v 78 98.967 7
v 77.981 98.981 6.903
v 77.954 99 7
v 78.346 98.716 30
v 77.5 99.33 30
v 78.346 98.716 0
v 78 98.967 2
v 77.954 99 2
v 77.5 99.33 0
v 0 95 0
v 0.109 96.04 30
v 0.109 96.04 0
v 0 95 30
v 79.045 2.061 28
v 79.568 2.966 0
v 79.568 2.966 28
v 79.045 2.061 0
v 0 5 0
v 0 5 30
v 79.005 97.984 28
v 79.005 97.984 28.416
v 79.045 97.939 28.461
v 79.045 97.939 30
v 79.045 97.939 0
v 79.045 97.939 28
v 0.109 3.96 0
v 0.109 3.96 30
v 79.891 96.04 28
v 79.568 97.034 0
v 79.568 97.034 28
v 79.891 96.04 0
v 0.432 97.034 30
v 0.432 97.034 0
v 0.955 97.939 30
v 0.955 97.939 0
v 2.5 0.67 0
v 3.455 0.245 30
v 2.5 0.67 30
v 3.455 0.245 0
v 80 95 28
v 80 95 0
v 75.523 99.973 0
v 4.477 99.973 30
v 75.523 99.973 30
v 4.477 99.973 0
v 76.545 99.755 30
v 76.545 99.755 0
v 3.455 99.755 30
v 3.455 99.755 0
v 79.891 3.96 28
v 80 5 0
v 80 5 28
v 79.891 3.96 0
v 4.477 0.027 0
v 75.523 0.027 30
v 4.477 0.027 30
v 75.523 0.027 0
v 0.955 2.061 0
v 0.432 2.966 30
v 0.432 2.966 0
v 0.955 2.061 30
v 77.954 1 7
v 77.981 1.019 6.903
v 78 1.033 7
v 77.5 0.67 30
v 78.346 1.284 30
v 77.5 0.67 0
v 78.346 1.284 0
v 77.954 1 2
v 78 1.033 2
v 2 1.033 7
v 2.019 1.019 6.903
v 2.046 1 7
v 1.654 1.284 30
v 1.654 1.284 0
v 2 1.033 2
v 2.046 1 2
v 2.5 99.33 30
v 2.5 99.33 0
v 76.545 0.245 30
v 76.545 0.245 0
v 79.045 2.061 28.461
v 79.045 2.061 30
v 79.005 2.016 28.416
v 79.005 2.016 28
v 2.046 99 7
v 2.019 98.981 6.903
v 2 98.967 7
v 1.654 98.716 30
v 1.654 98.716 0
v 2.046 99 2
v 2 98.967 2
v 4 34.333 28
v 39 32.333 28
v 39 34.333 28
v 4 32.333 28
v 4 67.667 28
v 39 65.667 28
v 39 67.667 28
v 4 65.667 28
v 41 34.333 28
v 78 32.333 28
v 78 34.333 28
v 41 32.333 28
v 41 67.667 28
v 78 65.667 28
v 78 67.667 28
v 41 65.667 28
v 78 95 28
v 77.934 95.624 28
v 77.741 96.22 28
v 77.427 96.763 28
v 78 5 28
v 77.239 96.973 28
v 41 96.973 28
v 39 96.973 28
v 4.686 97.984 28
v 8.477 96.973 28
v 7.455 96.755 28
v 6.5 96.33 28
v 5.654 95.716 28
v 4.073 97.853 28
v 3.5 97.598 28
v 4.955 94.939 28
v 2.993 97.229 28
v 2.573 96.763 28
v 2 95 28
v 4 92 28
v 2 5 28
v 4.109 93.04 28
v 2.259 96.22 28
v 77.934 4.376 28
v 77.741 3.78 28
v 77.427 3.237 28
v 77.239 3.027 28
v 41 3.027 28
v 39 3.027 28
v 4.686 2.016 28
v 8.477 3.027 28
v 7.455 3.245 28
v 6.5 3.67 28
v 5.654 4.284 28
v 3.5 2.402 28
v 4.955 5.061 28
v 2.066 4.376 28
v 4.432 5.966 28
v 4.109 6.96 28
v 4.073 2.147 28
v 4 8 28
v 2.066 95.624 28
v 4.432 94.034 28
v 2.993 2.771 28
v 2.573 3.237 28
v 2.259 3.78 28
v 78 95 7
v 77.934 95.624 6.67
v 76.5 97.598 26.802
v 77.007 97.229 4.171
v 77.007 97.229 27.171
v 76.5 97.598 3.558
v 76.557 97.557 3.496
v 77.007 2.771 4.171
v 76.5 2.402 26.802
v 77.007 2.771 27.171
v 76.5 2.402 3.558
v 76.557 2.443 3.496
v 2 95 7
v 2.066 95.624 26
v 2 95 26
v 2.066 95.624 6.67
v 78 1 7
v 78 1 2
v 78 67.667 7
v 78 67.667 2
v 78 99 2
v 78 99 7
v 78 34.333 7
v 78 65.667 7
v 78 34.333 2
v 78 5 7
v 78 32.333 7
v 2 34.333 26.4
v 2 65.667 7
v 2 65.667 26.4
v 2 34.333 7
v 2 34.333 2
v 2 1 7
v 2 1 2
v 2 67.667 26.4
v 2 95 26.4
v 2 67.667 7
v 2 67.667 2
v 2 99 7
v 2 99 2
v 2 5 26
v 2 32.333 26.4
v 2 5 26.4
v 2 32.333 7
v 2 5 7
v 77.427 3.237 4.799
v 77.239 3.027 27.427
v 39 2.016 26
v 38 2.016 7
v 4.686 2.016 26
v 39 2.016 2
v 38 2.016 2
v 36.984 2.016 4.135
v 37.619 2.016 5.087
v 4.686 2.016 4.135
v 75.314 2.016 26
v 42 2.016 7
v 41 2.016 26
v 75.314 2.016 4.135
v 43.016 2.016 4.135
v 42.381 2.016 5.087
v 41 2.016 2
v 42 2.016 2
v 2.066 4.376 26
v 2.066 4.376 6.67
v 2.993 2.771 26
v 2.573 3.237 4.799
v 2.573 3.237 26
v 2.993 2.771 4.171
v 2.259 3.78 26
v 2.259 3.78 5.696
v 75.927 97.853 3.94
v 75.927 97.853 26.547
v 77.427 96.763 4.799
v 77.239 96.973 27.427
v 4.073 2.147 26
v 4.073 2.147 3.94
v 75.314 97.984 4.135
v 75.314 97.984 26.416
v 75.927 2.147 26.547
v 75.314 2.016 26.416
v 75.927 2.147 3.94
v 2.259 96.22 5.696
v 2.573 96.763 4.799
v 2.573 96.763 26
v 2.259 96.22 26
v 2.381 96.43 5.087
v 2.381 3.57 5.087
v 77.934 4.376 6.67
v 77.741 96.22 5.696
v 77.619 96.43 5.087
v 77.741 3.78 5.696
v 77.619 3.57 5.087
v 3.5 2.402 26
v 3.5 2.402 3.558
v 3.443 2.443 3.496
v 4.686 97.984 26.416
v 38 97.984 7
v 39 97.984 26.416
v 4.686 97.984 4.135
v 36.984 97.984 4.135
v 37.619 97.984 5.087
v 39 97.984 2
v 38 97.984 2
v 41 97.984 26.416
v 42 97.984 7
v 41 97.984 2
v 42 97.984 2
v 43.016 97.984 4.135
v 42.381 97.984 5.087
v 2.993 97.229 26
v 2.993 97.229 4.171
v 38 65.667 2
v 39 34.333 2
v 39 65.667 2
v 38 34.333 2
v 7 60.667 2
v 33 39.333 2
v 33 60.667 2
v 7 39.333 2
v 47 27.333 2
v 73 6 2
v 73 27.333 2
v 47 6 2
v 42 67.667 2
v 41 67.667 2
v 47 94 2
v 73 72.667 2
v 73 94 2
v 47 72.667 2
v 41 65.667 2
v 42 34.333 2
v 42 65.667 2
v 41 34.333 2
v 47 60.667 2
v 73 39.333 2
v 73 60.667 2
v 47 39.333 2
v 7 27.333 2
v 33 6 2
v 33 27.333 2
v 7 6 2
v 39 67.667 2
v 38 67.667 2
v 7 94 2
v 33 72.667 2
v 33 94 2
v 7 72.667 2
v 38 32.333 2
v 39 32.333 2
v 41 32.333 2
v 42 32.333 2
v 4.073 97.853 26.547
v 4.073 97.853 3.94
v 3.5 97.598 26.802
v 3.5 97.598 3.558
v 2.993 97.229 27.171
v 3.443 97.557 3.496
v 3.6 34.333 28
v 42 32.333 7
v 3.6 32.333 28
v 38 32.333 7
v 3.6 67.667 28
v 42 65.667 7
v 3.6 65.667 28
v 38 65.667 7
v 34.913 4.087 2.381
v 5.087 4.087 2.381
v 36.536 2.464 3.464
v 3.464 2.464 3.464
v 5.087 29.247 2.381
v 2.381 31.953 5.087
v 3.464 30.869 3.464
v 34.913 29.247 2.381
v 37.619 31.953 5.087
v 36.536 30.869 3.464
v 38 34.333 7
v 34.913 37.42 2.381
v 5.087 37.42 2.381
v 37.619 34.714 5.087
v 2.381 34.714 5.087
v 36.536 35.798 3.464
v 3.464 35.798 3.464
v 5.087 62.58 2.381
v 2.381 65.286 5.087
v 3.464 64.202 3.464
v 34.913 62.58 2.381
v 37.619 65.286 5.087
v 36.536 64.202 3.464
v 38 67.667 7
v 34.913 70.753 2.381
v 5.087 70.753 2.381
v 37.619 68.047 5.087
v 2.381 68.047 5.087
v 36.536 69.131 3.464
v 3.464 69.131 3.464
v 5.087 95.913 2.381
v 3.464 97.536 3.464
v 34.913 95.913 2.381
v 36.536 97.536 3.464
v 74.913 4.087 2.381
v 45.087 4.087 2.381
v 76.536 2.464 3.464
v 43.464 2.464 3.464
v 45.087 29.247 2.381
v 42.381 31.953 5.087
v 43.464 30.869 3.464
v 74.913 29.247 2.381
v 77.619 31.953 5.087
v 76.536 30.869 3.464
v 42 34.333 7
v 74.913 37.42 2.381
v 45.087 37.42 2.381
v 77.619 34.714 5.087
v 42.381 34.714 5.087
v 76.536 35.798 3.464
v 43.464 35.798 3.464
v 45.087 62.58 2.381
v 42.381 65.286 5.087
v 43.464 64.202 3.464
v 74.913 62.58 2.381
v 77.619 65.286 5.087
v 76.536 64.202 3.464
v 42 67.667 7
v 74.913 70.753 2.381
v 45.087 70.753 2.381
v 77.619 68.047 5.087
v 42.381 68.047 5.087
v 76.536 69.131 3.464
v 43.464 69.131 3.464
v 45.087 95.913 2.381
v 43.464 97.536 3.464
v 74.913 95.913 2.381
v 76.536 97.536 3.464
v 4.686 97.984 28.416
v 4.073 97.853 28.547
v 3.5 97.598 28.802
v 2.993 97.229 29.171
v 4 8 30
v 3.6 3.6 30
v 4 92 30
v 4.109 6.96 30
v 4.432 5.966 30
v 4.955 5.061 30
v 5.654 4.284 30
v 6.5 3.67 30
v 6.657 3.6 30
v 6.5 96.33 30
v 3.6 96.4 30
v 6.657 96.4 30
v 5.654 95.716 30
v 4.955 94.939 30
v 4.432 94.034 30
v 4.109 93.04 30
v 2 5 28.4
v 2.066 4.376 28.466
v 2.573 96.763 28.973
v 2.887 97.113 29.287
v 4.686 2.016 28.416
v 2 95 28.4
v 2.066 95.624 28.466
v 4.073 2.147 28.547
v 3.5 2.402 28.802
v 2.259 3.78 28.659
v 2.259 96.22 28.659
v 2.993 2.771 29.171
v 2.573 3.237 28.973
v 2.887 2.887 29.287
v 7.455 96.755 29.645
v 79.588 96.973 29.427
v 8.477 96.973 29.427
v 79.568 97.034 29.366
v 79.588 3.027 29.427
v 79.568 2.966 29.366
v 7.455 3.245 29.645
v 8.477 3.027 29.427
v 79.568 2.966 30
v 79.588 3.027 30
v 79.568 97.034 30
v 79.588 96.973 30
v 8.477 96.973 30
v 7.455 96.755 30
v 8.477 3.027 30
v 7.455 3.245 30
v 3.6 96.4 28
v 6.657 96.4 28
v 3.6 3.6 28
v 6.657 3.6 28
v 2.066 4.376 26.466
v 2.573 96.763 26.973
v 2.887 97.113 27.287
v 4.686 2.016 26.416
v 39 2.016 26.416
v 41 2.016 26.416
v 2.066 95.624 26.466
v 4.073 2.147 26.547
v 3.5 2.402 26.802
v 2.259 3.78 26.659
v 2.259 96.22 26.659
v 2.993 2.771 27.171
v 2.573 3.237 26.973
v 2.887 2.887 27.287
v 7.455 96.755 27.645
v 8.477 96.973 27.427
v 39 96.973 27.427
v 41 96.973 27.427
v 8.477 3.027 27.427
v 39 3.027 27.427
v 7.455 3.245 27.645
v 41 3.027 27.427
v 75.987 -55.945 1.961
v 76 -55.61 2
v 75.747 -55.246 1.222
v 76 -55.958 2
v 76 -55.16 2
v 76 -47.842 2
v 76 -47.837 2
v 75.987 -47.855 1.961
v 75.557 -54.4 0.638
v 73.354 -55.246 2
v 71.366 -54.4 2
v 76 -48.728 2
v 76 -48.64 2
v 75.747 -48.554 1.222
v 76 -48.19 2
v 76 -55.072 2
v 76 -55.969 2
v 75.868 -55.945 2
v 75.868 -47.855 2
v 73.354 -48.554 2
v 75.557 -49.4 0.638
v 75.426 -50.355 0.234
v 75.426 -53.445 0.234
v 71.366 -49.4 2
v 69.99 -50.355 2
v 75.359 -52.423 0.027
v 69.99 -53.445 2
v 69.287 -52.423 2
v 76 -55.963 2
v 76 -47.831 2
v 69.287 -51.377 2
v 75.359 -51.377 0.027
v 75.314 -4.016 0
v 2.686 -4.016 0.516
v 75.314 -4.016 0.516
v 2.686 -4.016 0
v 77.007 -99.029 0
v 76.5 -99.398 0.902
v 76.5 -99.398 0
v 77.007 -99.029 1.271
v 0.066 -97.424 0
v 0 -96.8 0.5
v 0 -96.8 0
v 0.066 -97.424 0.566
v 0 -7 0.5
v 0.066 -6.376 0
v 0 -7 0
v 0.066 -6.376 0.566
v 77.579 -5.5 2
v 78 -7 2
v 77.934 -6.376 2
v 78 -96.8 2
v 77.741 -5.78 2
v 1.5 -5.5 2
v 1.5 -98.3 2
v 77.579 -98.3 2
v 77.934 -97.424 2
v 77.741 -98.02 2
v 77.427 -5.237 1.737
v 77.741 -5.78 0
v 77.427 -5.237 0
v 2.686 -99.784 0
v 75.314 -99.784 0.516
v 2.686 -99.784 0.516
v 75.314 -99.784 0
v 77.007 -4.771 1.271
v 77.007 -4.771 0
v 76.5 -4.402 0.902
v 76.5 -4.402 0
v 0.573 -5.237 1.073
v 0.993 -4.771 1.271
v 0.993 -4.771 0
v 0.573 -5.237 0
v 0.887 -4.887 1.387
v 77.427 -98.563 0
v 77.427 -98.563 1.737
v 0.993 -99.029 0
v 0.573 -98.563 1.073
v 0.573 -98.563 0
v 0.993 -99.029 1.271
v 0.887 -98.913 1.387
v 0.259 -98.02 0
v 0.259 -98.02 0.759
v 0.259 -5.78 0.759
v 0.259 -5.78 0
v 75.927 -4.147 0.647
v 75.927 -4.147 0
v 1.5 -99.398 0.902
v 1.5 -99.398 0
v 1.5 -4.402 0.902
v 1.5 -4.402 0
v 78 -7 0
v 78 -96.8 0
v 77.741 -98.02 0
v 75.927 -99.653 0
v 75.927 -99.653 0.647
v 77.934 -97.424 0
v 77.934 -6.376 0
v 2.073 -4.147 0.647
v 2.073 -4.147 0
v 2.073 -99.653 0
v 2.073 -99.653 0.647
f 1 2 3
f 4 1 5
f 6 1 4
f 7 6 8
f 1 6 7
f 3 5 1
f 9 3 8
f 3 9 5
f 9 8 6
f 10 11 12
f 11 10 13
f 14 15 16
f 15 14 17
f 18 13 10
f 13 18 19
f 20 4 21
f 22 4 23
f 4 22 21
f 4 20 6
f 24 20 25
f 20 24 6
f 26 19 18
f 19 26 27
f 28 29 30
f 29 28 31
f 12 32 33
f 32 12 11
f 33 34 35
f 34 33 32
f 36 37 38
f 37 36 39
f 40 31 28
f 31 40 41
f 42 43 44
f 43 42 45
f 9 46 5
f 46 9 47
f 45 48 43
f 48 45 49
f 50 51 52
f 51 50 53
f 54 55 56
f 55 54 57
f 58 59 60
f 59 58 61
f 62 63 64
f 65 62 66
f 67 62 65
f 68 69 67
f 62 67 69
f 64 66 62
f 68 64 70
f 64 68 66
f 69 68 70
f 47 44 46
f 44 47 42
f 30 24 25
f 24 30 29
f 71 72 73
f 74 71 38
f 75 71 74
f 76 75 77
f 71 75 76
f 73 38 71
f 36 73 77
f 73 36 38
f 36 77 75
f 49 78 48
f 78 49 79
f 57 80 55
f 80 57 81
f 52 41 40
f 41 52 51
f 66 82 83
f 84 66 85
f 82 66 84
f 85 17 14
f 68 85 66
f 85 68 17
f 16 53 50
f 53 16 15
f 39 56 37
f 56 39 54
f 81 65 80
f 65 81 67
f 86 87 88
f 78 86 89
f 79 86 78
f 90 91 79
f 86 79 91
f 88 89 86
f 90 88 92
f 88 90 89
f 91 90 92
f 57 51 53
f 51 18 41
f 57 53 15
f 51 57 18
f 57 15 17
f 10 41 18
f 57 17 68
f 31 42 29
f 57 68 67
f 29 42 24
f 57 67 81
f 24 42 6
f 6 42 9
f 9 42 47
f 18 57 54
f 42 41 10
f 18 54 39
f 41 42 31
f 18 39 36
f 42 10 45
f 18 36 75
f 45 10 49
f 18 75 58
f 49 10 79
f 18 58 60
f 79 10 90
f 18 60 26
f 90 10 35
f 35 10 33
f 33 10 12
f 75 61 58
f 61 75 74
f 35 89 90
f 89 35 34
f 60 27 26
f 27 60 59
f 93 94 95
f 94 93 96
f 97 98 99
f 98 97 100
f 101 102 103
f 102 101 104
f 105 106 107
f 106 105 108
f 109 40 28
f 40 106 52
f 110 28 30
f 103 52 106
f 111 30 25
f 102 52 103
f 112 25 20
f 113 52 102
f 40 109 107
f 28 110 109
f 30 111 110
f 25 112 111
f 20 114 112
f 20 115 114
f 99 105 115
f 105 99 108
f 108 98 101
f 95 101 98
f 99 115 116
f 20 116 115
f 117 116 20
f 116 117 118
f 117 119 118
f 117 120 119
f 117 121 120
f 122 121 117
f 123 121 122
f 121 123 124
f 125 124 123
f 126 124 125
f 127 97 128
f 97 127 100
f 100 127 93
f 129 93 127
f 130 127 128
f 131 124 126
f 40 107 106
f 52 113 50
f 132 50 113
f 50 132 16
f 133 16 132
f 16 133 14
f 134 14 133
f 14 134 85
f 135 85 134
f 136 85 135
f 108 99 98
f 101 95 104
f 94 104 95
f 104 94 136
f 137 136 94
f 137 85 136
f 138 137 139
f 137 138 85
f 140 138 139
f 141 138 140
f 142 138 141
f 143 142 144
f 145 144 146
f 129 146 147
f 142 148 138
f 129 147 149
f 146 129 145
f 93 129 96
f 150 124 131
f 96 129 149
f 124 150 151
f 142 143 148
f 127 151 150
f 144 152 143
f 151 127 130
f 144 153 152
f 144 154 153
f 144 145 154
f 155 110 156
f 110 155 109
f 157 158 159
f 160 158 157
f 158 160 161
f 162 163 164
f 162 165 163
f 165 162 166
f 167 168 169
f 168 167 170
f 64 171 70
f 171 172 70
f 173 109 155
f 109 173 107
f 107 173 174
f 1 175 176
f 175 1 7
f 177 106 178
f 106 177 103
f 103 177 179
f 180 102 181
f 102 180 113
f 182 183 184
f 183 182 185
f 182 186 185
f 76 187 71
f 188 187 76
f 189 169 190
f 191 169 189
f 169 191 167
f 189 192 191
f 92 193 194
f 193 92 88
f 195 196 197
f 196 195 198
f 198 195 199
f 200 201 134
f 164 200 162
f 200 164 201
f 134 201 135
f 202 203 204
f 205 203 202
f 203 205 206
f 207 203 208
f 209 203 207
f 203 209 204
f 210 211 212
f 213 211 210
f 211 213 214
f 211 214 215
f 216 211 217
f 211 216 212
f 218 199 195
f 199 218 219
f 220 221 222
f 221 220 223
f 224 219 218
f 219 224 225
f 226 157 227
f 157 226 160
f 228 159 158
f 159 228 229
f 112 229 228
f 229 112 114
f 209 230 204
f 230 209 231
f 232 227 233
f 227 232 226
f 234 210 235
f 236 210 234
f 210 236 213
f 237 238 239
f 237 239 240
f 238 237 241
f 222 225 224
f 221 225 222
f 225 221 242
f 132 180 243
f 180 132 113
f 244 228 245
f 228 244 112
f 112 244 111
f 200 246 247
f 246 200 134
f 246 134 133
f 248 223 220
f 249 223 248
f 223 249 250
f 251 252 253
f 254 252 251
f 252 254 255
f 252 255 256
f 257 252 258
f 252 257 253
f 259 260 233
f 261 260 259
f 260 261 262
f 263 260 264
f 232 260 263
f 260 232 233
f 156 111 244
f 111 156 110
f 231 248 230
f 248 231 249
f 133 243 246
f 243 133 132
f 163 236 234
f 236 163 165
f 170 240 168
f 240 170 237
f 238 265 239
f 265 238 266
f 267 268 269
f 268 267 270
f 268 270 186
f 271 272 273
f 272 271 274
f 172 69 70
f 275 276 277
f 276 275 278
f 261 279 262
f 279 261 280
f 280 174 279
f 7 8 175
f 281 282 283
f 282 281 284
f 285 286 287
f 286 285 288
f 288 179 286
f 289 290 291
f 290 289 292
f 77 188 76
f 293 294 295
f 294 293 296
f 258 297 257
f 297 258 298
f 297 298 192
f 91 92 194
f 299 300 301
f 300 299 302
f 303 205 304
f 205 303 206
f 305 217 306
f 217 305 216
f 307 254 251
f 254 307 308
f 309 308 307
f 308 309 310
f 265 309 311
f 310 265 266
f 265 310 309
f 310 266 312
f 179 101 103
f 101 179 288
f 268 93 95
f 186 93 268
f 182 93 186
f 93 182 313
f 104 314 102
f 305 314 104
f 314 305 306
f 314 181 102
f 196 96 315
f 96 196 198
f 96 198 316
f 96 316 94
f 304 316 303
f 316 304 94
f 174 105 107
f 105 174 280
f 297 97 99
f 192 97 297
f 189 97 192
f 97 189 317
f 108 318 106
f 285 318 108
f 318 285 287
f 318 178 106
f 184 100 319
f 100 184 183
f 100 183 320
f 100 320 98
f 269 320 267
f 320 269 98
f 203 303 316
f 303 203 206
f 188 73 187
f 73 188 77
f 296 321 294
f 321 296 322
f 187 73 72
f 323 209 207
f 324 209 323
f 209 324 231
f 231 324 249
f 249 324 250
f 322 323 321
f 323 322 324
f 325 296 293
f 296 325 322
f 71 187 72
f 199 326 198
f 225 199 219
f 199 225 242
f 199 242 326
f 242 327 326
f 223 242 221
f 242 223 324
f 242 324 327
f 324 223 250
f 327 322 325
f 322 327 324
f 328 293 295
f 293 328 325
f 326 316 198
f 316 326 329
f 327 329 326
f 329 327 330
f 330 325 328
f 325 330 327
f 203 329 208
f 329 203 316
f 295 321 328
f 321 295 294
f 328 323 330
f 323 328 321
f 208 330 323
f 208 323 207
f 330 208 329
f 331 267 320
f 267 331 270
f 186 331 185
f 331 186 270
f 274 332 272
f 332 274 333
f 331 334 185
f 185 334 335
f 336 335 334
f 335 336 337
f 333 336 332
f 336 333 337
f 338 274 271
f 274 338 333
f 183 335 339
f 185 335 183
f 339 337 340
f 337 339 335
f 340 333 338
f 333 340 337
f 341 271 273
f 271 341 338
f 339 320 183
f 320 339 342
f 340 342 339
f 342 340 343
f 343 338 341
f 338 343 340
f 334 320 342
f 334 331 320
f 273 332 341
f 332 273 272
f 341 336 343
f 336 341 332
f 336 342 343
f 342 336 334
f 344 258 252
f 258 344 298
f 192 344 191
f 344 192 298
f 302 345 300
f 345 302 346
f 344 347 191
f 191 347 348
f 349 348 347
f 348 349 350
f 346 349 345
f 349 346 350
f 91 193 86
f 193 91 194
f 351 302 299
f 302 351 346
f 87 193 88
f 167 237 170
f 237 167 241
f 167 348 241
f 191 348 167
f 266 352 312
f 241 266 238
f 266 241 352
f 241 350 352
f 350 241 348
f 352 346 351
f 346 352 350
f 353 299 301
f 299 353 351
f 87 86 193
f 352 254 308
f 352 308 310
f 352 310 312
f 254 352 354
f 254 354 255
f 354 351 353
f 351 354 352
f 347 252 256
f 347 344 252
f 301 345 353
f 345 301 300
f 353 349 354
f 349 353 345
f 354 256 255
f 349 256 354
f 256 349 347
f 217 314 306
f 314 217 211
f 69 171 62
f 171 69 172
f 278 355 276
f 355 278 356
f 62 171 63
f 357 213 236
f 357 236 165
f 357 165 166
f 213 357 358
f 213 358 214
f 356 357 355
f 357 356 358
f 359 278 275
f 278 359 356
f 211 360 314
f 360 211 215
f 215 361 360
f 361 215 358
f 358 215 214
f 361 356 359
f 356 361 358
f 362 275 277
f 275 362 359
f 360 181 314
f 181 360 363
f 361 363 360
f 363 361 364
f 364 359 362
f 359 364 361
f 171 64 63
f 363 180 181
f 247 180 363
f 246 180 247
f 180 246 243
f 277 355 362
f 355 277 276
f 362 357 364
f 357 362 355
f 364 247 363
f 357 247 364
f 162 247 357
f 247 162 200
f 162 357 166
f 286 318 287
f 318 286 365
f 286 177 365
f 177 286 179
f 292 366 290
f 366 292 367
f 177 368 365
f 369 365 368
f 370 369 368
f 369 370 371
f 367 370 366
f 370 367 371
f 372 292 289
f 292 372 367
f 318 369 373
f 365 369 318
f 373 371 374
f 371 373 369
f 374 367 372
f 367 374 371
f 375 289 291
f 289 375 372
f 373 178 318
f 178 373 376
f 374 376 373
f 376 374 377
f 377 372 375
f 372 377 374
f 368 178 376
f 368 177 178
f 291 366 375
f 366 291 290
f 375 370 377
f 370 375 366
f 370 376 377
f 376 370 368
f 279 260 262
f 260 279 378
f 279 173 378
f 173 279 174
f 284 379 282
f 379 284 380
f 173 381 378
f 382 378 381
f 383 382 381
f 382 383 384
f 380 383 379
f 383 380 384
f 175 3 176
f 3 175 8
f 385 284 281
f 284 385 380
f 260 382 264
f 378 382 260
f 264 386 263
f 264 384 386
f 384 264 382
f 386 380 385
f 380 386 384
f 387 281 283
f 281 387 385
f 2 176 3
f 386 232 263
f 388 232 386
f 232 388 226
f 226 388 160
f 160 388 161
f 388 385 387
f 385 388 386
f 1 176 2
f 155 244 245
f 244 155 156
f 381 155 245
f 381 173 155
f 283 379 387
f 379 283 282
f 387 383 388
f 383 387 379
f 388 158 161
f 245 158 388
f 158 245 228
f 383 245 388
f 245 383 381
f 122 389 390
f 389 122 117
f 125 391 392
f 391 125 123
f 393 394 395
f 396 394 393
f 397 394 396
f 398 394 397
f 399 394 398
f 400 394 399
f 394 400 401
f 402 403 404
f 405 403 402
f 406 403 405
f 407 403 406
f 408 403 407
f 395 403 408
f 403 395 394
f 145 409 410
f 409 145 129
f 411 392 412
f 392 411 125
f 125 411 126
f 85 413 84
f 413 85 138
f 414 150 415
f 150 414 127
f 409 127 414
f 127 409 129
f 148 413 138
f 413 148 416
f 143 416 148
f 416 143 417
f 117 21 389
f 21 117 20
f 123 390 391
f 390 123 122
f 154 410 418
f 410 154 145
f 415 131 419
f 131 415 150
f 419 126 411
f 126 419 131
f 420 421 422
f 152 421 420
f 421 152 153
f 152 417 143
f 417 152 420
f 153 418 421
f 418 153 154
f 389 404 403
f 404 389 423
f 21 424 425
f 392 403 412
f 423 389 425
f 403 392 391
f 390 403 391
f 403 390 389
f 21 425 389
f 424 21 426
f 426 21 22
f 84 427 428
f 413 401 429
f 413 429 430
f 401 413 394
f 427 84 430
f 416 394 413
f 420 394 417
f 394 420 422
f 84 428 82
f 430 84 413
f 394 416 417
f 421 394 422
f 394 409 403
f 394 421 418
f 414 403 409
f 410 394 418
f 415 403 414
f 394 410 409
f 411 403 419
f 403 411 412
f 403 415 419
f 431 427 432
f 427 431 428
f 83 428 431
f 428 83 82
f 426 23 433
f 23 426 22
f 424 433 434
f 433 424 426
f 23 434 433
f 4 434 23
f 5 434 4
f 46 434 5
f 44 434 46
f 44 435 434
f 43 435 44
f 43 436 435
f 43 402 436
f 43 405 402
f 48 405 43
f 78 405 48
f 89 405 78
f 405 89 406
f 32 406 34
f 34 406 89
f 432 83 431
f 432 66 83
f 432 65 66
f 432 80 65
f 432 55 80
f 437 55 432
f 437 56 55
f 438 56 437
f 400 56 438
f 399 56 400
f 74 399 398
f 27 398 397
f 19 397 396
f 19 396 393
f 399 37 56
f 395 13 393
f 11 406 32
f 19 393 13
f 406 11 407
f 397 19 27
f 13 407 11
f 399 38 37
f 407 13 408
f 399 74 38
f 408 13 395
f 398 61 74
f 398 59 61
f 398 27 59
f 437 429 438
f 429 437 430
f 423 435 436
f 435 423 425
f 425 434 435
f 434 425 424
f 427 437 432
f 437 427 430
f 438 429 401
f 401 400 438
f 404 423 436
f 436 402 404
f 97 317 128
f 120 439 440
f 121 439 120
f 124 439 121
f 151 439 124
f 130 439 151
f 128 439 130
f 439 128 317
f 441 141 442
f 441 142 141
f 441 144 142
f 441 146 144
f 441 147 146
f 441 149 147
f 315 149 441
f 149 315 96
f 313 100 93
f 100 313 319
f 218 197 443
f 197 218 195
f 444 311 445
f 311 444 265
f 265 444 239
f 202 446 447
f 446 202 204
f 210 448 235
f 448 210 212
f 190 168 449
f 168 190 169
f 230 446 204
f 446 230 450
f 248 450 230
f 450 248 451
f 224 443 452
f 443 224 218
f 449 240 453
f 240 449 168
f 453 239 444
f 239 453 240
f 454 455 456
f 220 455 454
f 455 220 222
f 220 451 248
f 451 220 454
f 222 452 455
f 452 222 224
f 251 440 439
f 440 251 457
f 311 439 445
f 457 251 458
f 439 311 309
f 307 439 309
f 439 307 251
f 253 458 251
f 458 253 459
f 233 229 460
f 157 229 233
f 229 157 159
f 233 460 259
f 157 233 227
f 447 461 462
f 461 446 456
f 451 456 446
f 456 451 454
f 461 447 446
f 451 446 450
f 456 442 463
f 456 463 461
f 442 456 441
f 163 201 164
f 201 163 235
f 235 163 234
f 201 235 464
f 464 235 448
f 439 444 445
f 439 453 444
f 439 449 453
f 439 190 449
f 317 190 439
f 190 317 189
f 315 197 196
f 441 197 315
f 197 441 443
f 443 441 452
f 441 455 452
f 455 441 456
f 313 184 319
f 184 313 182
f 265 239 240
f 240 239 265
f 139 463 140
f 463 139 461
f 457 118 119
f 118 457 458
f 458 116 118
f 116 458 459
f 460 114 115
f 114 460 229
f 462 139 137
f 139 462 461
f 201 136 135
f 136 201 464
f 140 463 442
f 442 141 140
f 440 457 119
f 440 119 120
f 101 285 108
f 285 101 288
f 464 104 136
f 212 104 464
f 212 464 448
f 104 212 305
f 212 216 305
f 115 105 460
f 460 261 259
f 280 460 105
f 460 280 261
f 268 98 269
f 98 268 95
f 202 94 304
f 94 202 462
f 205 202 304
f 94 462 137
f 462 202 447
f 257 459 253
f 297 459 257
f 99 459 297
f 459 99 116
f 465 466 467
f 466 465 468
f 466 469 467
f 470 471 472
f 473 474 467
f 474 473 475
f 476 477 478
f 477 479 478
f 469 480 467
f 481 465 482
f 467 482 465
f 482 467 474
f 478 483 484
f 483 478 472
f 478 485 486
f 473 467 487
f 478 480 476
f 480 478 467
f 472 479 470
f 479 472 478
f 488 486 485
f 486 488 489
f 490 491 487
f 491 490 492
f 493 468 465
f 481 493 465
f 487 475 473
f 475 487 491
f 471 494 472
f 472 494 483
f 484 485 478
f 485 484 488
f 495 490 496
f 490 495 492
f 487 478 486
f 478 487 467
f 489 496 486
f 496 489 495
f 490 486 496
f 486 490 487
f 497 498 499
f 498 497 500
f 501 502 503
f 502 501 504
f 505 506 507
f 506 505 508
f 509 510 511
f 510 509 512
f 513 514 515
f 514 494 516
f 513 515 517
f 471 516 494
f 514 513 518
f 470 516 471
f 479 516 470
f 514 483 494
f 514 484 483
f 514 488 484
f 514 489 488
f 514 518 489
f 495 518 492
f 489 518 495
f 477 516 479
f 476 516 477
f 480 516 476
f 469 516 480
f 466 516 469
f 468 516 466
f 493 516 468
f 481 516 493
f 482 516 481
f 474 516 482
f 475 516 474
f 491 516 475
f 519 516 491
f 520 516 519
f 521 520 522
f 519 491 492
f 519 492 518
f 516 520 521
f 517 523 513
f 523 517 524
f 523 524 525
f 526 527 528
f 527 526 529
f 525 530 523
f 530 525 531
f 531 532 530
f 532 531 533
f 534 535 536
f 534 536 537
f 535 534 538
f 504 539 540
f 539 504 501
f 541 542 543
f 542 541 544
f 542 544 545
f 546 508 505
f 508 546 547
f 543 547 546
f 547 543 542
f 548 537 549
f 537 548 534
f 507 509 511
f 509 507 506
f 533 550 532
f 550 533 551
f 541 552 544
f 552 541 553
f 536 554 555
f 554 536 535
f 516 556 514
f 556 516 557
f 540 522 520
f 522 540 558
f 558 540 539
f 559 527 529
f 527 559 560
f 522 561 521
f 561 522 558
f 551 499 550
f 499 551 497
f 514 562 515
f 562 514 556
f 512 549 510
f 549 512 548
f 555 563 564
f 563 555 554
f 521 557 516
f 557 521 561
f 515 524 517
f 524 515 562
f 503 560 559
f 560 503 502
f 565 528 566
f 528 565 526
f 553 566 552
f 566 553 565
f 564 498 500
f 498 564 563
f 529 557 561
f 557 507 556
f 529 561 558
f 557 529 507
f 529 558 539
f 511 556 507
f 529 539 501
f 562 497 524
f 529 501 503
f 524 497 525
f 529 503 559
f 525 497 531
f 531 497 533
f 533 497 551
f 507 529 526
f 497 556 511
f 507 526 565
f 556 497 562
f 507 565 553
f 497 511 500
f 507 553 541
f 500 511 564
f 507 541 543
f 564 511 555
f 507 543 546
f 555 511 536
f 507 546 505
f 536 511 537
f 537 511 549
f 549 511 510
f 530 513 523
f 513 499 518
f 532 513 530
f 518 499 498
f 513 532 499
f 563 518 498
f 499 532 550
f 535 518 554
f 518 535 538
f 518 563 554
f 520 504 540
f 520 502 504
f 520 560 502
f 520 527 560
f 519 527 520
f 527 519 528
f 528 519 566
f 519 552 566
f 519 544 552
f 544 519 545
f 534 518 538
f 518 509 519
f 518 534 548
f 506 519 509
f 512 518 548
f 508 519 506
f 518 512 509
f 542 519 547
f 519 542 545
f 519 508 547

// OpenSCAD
itemsShown="both"; // [both,box,lid]
boxLength=80;
boxWidth=100;
boxHeight=30;
cornerRadius=5;
wallThickness=2;
bottomThickness=2;
lidThickness=2;
lidClearance=0.2;
lidEdgeThickness=0.5;
columns = 3; //[1:10]
rows = 2; //[1:10]
// Notch in the lid
withNotch=true;//[true:false]
innerBevel = 5;//[0:.25:10]

/* [Global] */
if (itemsShown=="box") showBox();
if (itemsShown=="lid") showLid();
if (itemsShown=="both"){showBox();showLid();}


module showLid(){
	translate ([0, -2*wallThickness, 0]) 
	roundBoxLid(l=boxLength-wallThickness,
				w=boxWidth-2*wallThickness-lidClearance,
				h=lidThickness,
				et=lidEdgeThickness,
				r=cornerRadius-wallThickness,
				notch=withNotch);
}

module showBox(){
	round_box(l=boxLength,
			  w=boxWidth,
			  h=boxHeight,
			  bt=bottomThickness,
			  wt=wallThickness,
			  lt=lidThickness,
			  r=cornerRadius,
              rs=rows,
              cs=columns);
}

module round_box(l=40,w=30,h=30,bt=2,wt=2,lt=2,r=5,rs=1,cs=1){
	difference() { 
		round_cube(l=l,w=w,h=h-lt,r=r);
		translate ([wt, wt, bt]) 
		round_cube(l=l-wt*2,w=w-wt*2,h=h,r=r-wt);
	}
    
    // add cells
    for (i = [2:1:rs]) {
        translate([(l/rs)*(i-1)-(wt/2),wt,wt])
        cube([wt, w - wt*2, h-wt*2]);
    }
    for (i = [2:1:cs]) {
        translate([wt, (w/cs)*(i-1)-(wt/2), wt])
        cube([l - wt*2, wt, h-wt*2]);
    }
    
    // add inner bevels
    for (row = [0:rs-1], column = [0:cs-1]) {
		ht = wt / 2;
		roundBoxBevel(
			x1=wt + row * (l / rs),
			y1=ht + column * (w / cs),
			x2=(row +1) * (l / rs) - wt,
			y2=(column+1) * (w / cs) - ht,
			radius=innerBevel,
			wt=wt
		);
    }
    
	//use two box rims. one to make a slope to support the lid
	roundBoxRim();
	translate ([0, 0, -wt]) roundBoxRim();
}


module roundBoxRim(l=boxLength,
				   w=boxWidth,
				   h=boxHeight,
				   et=lidEdgeThickness,
				   r=cornerRadius,
				   wt=wallThickness,
				   lt=lidThickness){
	difference() { 
		translate ([0, 0, h-lt]) 
		round_cube(l=l,w=w,h=lt,r=r);
		translate ([wt+lt,wt+lt-et*2,h-lt-0.1]) 
		round_cube(l=l*2,w=w-2*(wt+lt)+4*et,h=lt+0.2,r=r-wt+lt);

		//subtract out a lid to make the ledge
		translate ([wt, w-wt, h-lt-0.1])
		roundBoxLid(l=l*2,w=w-2*wt,h=lt+0.1,wt=wt,t=lt,et=0.5,r=r-wt,notch=false);
	}
}

module roundBoxLid(l=40,w=30,h=3,wt=2,t=2,et=0.5,r=5,notch=true){
	translate ([l, 0, 0]) 
	rotate (a = [0, 0, 180]) 
	difference(){
		round_cube(l=l,w=w,h=h,t=t,r=r);

		translate ([-1, 0, et]) rotate (a = [45, 0, 0])  cube (size = [l+2, h*2, h*2]); 
		translate ([-1, w, et]) rotate (a = [45, 0, 0])  cube (size = [l+2, h*2, h*2]); 
		translate ([l, -1, et]) rotate (a = [45, 0, 90]) cube (size = [w+2, h*2, h*2]); 
		if (notch==true){
			translate([2,w/2,h+0.001]) thumbNotch(10/2,72,t);
		}
	}
}

module thumbNotch(
	thumbR=12/2,
	angle=72,
	notchHeight=2){

	size=10*thumbR;

	rotate([0,0,90])
	difference(){
		translate([0,
					(thumbR*sin(angle)-notchHeight)/tan(angle),
					 thumbR*sin(angle)-notchHeight])
		rotate([angle,0,0])
		cylinder(r=thumbR,h=size,$fn=30);

		translate([-size,-size,0])
		cube(size*2);
	}
}

module round_cube(l=40,w=30,h=20,r=5,$fn=30){
	hull(){ 
		translate ([r, r, 0]) cylinder (h = h, r=r);
		translate ([r, w-r, 0]) cylinder (h = h, r=r);
		translate ([l-r,w-r, 0]) cylinder (h = h, r=r);
		translate ([l-r, r, 0]) cylinder (h = h, r=r);
	}
}

module roundBoxBevel(x1,y1,x2,y2,radius,wt) {
//%   color("red", .25) translate([x1, y1, 0]) cube([x2-x1, y2-y1, 50]);
    if (radius > 0) {
        translate([x1, y1, wt]) rotate([0, 0, 90]) rotate([90, 0, 0]) bevel(x2-x1, radius);
        translate([x1, y2, wt]) rotate([90, 0, 0]) rotate([0, 0, 0]) bevel(y2-y1, radius);
        translate([x2, y2, wt]) rotate([0, 0, 270]) rotate([90, 0, 0]) bevel(x2-x1, radius);
        translate([x2, y2, wt]) rotate([0, 0, 90]) rotate([0, 270, 0]) bevel(y2-y1, radius);
    }
}

module bevel(length,radius) {
    difference() {
        cube([radius, radius, length]);
        translate([radius, radius, -1])
        cylinder(length + 2, radius, radius, false);
    }
}
    
